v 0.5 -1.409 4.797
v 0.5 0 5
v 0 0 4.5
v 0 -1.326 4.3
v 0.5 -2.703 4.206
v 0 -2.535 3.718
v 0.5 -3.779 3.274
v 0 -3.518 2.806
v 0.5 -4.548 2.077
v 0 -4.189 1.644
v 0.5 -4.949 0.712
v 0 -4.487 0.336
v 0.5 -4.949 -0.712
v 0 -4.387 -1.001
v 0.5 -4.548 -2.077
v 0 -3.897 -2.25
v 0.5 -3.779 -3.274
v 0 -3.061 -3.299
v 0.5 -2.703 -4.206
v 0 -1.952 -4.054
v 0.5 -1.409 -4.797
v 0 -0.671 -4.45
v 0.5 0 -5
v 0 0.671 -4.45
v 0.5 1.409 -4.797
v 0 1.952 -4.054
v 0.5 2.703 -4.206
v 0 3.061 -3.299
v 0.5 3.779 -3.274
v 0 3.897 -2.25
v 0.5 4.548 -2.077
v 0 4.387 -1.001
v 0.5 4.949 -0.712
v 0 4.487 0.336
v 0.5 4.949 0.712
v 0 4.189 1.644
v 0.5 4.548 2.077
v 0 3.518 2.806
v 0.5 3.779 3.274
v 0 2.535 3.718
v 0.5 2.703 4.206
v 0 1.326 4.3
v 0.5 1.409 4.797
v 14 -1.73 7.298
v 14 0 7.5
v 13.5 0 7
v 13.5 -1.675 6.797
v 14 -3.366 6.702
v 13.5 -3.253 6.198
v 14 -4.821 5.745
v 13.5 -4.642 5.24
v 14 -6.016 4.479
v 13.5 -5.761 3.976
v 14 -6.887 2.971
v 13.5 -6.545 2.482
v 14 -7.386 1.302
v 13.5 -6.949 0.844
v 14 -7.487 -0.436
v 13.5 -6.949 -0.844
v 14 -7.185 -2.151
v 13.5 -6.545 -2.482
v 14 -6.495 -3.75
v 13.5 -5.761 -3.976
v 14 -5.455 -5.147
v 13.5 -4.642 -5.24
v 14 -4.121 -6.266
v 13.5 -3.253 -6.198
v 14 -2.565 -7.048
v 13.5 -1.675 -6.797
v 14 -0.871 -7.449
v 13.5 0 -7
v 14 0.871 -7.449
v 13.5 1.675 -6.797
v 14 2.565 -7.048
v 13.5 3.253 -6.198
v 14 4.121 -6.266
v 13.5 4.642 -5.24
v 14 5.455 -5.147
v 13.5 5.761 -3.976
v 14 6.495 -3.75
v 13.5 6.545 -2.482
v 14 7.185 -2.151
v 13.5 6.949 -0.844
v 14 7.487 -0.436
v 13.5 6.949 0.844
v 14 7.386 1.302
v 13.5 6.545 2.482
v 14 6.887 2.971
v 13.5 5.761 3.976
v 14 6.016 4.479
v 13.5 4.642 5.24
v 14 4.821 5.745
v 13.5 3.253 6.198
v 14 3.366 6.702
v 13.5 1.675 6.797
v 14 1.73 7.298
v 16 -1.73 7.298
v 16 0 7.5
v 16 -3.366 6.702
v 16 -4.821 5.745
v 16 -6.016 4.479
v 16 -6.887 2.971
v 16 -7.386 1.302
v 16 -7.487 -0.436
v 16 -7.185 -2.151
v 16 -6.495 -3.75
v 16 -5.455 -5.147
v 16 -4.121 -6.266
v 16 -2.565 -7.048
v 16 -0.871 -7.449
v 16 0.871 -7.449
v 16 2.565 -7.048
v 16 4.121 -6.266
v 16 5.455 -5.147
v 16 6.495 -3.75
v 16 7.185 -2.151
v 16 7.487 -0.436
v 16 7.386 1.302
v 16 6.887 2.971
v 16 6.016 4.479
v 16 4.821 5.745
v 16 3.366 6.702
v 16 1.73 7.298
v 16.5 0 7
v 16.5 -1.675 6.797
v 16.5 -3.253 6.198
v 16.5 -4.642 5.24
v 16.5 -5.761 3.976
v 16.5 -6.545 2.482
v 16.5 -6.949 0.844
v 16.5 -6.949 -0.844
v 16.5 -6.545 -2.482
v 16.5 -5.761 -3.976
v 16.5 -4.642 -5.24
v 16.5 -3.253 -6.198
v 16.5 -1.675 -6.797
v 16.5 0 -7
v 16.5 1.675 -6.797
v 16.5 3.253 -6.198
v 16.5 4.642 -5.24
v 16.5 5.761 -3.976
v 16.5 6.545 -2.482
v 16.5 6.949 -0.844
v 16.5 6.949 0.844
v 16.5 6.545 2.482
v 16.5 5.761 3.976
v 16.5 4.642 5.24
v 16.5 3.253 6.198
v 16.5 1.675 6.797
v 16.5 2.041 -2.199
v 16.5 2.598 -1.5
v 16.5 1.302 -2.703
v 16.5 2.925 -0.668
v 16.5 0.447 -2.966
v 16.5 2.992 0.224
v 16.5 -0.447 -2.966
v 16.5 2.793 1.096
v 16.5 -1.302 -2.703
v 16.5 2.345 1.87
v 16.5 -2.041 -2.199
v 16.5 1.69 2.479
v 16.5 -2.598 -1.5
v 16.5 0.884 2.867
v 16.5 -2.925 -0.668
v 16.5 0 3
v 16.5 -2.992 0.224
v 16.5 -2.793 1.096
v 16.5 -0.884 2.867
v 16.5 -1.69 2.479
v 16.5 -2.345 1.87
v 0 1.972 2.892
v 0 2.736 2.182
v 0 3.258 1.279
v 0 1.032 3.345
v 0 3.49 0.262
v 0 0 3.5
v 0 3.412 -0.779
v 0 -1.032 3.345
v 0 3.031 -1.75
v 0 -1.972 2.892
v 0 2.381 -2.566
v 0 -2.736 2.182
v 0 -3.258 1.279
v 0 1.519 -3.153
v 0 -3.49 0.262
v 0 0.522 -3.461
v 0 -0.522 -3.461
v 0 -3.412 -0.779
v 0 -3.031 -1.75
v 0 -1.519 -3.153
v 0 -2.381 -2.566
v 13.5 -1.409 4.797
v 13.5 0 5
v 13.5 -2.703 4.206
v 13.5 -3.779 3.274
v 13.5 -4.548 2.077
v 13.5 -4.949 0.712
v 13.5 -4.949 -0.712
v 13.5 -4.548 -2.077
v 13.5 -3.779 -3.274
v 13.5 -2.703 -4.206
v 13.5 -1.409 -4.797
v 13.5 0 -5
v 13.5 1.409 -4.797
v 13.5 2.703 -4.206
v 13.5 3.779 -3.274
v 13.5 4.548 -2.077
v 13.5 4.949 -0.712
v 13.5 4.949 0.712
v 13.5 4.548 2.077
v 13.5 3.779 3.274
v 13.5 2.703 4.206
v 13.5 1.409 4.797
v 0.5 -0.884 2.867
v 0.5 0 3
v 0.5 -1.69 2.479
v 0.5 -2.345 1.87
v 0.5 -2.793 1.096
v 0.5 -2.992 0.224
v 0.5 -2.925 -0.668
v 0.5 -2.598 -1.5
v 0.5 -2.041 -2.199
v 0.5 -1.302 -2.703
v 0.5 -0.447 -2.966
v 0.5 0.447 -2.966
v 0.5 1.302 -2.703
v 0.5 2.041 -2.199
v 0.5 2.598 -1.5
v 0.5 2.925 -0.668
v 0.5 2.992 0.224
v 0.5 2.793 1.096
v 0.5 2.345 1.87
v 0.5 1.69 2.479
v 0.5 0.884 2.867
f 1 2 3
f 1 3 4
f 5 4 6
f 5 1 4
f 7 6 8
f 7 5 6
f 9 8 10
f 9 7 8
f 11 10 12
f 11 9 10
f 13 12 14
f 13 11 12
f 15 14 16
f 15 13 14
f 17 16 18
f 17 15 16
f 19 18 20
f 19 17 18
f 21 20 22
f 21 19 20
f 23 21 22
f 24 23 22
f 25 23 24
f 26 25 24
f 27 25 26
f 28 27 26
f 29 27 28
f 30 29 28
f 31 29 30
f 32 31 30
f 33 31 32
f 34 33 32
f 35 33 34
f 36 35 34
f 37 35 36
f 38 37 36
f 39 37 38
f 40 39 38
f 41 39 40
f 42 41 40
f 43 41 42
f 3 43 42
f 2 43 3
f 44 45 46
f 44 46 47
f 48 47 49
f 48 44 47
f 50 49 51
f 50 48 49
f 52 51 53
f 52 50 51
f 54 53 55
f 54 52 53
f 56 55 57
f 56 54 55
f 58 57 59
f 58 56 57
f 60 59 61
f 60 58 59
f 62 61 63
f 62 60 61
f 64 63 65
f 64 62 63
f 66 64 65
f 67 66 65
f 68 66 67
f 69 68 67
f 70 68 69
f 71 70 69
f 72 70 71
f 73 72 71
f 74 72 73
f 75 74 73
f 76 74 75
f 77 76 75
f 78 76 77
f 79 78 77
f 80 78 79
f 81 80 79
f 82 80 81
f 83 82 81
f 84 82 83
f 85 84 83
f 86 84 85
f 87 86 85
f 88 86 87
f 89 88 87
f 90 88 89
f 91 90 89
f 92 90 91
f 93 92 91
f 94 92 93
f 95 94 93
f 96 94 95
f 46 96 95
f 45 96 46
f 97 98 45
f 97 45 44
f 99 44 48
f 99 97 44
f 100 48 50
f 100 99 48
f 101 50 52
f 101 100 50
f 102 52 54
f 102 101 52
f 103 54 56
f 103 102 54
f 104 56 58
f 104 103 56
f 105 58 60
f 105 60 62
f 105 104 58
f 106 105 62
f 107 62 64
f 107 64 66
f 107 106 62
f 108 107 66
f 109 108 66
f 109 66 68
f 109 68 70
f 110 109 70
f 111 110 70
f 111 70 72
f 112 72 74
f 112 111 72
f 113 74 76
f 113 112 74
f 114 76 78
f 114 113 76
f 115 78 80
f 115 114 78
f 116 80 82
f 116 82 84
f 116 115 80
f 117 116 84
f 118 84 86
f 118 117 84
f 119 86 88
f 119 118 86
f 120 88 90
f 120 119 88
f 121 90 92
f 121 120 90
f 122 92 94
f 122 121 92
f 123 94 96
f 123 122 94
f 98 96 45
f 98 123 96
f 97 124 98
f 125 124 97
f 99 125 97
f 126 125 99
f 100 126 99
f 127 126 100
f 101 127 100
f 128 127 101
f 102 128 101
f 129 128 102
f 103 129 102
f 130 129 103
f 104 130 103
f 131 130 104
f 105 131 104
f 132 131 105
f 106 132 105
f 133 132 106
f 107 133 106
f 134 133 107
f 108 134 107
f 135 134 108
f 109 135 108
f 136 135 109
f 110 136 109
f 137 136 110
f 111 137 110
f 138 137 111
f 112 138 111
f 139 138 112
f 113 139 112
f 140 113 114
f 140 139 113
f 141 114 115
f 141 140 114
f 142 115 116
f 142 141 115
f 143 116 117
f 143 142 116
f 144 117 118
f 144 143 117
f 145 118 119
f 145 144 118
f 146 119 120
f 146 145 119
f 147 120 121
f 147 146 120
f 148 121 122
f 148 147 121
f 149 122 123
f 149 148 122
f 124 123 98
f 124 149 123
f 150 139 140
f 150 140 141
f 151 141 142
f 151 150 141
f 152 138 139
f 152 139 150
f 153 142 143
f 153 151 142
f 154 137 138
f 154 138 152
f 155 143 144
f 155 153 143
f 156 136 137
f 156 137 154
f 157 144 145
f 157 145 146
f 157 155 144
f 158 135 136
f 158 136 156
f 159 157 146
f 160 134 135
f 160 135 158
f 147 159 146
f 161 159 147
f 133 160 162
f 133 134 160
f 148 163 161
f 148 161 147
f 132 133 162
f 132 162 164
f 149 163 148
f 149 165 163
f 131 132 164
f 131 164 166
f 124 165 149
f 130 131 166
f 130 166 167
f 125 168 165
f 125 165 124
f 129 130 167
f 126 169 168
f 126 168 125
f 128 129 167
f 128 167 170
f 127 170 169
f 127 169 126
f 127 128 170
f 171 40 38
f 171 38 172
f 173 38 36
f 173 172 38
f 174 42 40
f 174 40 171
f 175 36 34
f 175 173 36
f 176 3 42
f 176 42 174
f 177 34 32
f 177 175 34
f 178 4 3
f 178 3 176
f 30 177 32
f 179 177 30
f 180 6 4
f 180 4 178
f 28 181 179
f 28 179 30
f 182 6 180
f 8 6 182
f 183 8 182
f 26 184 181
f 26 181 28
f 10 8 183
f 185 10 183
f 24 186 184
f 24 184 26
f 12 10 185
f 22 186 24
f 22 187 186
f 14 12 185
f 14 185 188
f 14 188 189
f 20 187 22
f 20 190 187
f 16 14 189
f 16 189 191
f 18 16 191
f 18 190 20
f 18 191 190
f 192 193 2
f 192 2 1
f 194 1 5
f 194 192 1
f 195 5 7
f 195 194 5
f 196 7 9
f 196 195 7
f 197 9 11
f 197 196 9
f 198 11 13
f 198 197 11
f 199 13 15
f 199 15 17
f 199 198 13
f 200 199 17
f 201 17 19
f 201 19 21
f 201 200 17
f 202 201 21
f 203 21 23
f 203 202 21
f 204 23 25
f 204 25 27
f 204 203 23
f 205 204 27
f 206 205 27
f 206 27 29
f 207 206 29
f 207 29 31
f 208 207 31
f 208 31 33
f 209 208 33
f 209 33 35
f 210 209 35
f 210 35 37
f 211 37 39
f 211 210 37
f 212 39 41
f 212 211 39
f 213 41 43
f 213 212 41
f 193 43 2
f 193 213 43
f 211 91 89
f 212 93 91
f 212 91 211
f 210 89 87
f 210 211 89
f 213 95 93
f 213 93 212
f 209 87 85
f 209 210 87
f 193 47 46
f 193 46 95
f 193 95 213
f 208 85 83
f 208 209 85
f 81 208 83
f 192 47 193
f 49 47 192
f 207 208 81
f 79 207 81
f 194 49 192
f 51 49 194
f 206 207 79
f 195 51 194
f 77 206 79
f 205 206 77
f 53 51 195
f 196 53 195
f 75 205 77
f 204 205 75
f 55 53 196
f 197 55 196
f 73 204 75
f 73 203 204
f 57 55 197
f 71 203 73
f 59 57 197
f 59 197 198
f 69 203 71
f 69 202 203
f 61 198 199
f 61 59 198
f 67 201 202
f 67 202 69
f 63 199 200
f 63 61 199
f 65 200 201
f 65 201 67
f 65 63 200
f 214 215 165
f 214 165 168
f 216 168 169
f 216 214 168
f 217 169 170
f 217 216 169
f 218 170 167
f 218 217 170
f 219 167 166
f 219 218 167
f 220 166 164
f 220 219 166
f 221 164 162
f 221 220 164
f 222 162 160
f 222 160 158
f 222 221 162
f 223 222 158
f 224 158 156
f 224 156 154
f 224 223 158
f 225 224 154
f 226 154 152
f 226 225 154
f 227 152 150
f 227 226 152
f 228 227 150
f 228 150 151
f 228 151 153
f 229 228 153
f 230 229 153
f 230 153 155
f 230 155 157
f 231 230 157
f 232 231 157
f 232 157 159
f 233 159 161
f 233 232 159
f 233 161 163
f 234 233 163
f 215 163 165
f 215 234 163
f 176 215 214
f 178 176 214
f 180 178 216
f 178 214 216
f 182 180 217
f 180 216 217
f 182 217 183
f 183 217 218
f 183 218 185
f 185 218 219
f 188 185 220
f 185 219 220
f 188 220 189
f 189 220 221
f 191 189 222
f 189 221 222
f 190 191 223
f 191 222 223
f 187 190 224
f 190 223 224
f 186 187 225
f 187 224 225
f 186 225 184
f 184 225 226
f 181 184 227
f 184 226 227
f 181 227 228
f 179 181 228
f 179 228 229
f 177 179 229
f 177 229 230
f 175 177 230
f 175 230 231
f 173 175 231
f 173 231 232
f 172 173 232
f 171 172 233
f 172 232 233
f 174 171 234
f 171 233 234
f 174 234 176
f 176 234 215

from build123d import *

# Parameters (mm, degrees)
CHANFREIN1_SIZE = 0.5


with BuildPart() as part:
    # Esquisse1 → Base-Révolution (revolve)
    with BuildSketch(Plane.XY, mode=Mode.PRIVATE) as base_r_volution_sk:
        Polygon((0, 3), (0, 5), (13.5, 5), (13.5, 7.5), (16.5, 7.5), (16.5, 3), align=None)
    revolve(base_r_volution_sk.sketch.rotate(Axis((0, 0, 0), (1, 0, 0)), 90), axis=Axis((0, 0, 0), (1, 0, 0)))

    # Chanfrein1
    chanfrein1_edges = [part.edges().sort_by_distance(p)[0] for p in [
        (16.5, 0, -7.5),
        (13.5, 0, -7.5),
        (0, 0, -5),
        (0, 0, -3),
    ]]
    chamfer(chanfrein1_edges, length=CHANFREIN1_SIZE)


solid = part.part
